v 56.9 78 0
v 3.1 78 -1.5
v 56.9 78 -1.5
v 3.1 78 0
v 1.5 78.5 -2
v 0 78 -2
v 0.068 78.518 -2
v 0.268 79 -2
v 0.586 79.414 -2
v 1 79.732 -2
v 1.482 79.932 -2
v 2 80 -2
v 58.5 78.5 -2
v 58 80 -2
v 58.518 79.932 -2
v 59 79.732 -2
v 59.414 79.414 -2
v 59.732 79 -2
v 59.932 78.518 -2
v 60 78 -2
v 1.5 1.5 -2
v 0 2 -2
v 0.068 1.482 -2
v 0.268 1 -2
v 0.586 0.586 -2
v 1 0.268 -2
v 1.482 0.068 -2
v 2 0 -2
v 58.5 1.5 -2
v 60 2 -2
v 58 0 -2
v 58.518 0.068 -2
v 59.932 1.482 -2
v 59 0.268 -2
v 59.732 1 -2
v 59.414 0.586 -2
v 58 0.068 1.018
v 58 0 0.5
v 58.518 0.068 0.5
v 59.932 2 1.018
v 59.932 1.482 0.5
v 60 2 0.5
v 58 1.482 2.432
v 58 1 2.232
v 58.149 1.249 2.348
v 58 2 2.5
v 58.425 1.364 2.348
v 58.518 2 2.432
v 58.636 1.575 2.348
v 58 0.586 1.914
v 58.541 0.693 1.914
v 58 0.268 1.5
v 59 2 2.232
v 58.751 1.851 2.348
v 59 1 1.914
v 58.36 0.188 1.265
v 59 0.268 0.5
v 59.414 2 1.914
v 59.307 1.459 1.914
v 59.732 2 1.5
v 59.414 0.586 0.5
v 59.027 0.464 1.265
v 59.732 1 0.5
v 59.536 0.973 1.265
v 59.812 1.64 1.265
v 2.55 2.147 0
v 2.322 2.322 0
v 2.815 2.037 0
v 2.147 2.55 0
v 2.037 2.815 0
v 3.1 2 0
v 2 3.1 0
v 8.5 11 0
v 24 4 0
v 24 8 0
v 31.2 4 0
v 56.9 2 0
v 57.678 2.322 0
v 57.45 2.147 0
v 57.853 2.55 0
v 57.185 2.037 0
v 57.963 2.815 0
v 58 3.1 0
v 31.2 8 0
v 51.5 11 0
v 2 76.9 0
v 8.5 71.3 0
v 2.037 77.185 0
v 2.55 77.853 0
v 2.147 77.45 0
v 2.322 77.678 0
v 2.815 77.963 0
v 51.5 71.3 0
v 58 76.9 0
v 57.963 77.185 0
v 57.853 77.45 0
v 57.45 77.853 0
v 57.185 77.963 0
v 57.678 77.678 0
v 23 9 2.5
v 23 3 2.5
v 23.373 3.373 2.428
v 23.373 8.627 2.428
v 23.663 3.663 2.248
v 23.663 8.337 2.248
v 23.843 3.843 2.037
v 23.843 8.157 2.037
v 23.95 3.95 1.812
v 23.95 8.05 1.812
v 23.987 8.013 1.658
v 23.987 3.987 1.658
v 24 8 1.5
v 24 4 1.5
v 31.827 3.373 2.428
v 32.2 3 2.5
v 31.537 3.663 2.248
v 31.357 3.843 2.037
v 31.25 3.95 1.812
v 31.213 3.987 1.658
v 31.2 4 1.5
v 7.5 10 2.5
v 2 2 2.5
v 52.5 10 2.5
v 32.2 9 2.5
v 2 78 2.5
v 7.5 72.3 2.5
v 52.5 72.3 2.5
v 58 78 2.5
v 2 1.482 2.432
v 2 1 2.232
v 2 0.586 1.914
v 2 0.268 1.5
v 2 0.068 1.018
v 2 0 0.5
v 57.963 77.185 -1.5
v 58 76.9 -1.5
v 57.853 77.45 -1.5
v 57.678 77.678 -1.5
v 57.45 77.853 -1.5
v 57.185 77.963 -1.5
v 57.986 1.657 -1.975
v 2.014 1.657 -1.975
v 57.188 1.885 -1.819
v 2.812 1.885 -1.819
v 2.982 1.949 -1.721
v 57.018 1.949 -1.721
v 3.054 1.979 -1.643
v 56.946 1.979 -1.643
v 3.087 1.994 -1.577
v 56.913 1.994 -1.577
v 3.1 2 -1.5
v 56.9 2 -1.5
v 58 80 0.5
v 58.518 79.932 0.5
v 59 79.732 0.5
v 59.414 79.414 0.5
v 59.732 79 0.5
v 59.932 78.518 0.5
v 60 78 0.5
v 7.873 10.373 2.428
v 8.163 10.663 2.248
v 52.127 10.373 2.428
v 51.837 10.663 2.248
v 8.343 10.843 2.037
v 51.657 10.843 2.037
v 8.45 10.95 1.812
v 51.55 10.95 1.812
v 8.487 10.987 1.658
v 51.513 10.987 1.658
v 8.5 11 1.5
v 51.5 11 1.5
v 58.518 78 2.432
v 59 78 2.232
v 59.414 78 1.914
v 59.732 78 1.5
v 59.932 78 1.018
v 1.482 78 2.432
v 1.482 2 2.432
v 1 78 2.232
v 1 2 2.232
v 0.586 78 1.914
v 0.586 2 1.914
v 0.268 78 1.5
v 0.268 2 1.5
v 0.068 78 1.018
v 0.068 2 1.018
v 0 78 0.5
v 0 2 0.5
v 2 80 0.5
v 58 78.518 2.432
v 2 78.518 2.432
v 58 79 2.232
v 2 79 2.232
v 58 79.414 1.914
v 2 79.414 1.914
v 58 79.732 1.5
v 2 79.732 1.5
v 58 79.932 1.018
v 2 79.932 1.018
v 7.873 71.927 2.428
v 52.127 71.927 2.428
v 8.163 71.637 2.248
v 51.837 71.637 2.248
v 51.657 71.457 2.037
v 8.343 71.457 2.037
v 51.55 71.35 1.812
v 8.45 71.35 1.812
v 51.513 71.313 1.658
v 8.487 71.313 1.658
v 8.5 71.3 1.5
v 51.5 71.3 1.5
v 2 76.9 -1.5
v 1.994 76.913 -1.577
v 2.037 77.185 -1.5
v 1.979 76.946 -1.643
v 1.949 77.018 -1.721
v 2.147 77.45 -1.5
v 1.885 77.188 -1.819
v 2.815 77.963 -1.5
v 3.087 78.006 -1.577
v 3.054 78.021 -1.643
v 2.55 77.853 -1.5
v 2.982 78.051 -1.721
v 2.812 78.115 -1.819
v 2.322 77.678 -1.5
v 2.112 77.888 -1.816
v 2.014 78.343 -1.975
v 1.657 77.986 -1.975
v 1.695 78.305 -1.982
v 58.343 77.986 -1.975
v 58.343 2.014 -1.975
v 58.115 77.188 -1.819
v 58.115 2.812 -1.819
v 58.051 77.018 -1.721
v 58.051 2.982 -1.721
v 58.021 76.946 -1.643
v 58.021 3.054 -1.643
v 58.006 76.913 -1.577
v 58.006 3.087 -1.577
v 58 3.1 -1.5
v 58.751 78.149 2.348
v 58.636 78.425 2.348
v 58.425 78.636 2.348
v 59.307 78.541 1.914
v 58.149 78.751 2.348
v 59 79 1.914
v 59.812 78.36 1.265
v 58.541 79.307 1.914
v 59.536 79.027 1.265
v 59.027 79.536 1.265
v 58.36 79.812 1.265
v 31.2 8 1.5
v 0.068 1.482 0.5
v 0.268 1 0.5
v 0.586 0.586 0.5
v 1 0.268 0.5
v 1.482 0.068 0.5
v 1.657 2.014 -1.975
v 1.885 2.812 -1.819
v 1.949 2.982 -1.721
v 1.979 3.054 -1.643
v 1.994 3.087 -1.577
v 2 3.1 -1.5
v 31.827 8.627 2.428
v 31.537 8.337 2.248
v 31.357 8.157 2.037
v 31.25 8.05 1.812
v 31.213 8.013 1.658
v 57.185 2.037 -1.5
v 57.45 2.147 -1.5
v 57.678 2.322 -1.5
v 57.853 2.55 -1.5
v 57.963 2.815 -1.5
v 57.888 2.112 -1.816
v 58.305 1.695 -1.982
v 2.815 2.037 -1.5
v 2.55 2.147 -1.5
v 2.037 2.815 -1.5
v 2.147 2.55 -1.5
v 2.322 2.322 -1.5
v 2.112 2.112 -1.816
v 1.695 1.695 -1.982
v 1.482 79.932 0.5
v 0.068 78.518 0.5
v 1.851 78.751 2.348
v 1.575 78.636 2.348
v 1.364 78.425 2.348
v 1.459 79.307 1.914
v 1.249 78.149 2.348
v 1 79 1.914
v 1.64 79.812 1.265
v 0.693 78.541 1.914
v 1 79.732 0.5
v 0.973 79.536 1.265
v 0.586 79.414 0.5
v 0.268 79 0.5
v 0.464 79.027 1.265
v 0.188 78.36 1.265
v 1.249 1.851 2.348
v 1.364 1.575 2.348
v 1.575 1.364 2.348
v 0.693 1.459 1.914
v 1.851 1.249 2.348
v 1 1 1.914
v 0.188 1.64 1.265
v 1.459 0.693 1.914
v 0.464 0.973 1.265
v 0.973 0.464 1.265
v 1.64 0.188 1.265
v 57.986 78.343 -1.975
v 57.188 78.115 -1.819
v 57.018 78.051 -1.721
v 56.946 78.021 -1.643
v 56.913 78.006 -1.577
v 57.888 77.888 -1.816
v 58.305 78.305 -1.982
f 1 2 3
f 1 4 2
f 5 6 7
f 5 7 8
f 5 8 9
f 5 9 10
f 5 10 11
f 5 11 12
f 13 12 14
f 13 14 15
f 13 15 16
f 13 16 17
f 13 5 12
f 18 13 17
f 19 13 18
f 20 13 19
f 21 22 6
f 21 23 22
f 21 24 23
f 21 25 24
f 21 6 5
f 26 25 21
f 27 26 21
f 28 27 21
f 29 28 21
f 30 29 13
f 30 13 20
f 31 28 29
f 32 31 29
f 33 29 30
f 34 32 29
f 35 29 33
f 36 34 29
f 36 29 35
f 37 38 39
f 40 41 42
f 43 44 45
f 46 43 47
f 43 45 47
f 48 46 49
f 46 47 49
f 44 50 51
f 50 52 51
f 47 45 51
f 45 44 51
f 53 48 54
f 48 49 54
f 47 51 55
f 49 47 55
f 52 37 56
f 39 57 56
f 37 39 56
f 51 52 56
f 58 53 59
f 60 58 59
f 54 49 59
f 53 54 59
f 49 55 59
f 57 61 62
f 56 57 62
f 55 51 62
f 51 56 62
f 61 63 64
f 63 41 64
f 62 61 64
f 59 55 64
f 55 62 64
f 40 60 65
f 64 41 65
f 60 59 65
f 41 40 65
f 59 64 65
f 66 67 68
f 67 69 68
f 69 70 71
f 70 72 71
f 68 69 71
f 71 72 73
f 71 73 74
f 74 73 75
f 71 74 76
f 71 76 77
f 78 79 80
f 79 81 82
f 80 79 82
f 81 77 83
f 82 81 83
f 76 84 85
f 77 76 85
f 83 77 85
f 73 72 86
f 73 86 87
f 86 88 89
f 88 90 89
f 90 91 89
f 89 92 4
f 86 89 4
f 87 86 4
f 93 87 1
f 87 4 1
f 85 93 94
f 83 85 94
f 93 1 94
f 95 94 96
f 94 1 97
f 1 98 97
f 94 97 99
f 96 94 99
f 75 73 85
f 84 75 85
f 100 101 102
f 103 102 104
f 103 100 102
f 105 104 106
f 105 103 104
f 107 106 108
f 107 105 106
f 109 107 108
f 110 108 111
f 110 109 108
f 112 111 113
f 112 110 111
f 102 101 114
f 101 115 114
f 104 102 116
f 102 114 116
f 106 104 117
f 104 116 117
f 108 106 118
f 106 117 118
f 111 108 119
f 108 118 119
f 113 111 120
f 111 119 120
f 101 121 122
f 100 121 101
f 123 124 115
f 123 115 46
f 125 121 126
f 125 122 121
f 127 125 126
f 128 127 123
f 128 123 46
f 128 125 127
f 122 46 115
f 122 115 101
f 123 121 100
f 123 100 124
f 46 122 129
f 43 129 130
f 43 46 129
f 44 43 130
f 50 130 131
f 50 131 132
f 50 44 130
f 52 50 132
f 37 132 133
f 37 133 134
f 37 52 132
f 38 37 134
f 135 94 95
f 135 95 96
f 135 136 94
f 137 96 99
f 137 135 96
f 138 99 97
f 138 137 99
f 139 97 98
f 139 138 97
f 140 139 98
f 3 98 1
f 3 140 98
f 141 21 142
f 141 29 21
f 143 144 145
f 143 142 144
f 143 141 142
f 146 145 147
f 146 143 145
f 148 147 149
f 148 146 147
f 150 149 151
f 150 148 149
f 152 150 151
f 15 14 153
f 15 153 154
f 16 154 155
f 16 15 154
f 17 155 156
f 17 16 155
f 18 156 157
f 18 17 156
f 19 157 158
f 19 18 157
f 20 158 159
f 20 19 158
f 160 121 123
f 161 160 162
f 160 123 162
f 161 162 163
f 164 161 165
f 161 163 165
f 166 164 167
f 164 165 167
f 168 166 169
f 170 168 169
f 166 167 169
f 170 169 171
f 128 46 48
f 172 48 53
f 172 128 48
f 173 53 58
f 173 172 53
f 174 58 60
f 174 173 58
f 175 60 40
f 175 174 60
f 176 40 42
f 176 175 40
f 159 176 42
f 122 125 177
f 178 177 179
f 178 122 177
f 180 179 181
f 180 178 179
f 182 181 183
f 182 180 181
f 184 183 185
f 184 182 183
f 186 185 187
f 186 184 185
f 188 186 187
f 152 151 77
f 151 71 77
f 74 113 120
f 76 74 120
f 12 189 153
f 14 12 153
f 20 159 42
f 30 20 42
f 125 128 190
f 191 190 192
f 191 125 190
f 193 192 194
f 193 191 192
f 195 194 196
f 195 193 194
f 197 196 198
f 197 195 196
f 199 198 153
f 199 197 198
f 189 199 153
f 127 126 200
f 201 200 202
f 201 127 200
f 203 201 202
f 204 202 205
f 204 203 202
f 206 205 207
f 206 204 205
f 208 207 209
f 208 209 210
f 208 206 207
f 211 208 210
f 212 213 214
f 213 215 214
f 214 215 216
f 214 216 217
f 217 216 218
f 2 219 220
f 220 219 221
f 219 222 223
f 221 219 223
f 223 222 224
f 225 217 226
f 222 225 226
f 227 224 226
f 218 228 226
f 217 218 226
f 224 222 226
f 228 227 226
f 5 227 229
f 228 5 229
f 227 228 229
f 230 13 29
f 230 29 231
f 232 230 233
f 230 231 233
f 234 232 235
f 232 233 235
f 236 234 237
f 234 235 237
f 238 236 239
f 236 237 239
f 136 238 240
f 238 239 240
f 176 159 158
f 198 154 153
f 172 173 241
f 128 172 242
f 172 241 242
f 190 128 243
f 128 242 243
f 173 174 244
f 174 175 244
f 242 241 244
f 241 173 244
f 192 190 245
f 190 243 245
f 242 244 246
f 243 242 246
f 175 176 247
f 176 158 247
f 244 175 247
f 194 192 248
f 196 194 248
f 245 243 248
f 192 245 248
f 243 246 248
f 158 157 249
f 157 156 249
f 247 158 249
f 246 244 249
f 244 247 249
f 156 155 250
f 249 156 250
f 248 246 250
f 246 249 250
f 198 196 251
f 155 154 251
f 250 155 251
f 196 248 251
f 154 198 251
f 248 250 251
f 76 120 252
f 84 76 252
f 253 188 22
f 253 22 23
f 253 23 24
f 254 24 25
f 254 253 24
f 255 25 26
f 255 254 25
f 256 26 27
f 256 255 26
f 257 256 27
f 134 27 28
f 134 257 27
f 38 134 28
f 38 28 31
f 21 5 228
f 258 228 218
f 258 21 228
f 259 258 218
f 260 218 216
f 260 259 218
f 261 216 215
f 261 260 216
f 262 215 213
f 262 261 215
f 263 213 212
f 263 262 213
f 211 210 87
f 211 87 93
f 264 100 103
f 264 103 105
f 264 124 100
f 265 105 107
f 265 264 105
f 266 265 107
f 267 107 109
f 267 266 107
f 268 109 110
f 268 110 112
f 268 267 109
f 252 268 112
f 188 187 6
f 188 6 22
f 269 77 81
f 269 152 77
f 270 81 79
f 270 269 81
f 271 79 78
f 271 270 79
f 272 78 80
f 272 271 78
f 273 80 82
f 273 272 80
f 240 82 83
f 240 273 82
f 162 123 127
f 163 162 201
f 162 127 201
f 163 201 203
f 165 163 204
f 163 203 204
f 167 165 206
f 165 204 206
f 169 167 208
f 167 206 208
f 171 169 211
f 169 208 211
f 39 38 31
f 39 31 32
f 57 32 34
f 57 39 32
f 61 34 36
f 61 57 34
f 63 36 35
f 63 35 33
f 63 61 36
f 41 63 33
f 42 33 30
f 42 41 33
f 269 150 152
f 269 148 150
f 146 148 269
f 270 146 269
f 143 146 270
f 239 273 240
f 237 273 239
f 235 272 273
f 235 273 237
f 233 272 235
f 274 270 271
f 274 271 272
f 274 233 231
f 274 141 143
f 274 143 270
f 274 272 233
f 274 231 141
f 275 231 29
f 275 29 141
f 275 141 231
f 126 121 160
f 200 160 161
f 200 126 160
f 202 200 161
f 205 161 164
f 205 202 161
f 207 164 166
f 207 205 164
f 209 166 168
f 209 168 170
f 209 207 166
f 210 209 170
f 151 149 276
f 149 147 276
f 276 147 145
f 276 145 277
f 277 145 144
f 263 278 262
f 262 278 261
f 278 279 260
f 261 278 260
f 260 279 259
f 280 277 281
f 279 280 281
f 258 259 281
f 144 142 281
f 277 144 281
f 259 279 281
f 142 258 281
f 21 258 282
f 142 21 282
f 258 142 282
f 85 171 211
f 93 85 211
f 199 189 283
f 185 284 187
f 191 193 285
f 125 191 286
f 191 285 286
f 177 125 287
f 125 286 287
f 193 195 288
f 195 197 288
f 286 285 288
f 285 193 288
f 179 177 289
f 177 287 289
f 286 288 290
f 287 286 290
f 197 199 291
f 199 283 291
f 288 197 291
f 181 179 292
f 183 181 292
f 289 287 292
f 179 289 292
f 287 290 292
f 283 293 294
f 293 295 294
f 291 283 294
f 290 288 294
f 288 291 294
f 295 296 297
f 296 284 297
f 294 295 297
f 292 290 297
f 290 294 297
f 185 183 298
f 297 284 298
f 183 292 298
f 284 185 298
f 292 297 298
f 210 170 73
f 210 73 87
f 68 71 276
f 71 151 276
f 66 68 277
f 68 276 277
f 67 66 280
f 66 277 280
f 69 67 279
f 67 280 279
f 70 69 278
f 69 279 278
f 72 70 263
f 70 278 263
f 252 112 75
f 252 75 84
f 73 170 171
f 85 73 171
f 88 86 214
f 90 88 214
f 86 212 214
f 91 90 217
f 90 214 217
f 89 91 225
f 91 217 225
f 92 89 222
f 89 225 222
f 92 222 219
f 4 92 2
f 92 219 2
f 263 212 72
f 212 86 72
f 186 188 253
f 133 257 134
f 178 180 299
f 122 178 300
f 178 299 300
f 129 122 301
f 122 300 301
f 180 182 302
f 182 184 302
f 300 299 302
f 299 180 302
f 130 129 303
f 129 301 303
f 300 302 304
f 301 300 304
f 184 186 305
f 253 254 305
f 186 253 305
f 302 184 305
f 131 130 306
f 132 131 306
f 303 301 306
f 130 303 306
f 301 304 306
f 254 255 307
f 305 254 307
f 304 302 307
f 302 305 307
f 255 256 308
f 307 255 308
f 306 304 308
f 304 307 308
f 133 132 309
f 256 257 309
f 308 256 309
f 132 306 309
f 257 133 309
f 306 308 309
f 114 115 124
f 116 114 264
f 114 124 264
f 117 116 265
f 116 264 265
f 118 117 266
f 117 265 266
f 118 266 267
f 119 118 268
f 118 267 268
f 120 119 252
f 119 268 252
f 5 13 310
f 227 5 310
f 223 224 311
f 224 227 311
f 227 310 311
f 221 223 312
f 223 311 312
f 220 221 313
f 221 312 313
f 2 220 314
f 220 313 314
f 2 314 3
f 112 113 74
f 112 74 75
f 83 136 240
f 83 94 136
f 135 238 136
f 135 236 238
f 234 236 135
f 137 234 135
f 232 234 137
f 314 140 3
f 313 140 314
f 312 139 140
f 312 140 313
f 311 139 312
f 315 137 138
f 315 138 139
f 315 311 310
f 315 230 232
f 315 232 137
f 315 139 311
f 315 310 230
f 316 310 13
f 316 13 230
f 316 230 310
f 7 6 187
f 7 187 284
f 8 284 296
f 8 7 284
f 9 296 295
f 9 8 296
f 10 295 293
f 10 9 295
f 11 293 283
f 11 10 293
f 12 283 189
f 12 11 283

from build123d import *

# Parameters (mm, degrees)
SKETCH003_W     = 60
SKETCH003_H     = 80
PAD_DEPTH       = 2.5
SKETCH_W        = 43
SKETCH_H        = 60.3
POCKET_DEPTH    = 5
SKETCH004_W     = 60
SKETCH004_H     = 80
SKETCH004_W_2   = 56
SKETCH004_H_2   = 76
PAD001_DEPTH    = 2
SKETCH005_W     = 7.2
SKETCH005_H     = 4
POCKET001_DEPTH = 5
FILLET_R        = 2
FILLET001_R     = 1
FILLET002_R     = 1
FILLET003_R     = 2
FILLET004_R     = 0.5
FILLET005_R     = 1.1


with BuildPart() as part:
    # Sketch003 → Pad (new body)
    with BuildSketch(Plane.XY):
        with Locations((30, 40)):
            Rectangle(SKETCH003_W, SKETCH003_H)
    extrude(amount=PAD_DEPTH)

    # Sketch (on Face6 of Pad) → Pocket (cut)
    with BuildSketch(Plane.XY.offset(2.5)):
        with Locations((30, 41.15)):
            Rectangle(SKETCH_W, SKETCH_H)
    extrude(amount=-POCKET_DEPTH, mode=Mode.SUBTRACT)

    # Sketch004 (on Face4 of Pocket) → Pad001 (join)
    with BuildSketch(Plane(origin=(0, 0, 0), x_dir=(1, 0, 0), z_dir=(0, 0, -1))):
        with Locations((30, -40)):
            Rectangle(SKETCH004_W, SKETCH004_H)
        with Locations((30, -40)):
            Rectangle(SKETCH004_W_2, SKETCH004_H_2, mode=Mode.SUBTRACT)
    extrude(amount=PAD001_DEPTH)

    # Sketch005 (on Face7 of Pad001) → Pocket001 (cut)
    with BuildSketch(Plane.XY.offset(2.5)):
        with Locations((27.6, 6)):
            Rectangle(SKETCH005_W, SKETCH005_H)
    extrude(amount=-POCKET001_DEPTH, mode=Mode.SUBTRACT)

    # Fillet
    fillet_edges = [part.edges().sort_by_distance(p)[0] for p in [
        (60, 0, 0.25),
        (0, 0, 0.25),
        (0, 80, 0.25),
        (60, 80, 0.25),
    ]]
    fillet(fillet_edges, radius=FILLET_R)

    # Fillet001
    fillet001_edges = [part.edges().sort_by_distance(p)[0] for p in [
        (30, 11, 2.5),
        (8.5, 41.15, 2.5),
        (30, 71.3, 2.5),
        (51.5, 41.15, 2.5),
    ]]
    fillet(fillet001_edges, radius=FILLET001_R)

    # Fillet002
    fillet002_edges = [part.edges().sort_by_distance(p)[0] for p in [
        (27.6, 4, 2.5),
        (24, 6, 2.5),
        (27.6, 8, 2.5),
        (31.2, 6, 2.5),
    ]]
    fillet(fillet002_edges, radius=FILLET002_R)

    # Fillet003
    fillet003_edges = [part.edges().sort_by_distance(p)[0] for p in [
        (30, 0, 2.5),
        (59.414214, 0.585786, 2.5),
        (60, 40, 2.5),
        (0.585786, 0.585786, 2.5),
        (0, 40, 2.5),
        (59.414214, 79.414214, 2.5),
        (30, 80, 2.5),
        (0.585786, 79.414214, 2.5),
    ]]
    fillet(fillet003_edges, radius=FILLET003_R)

    # Fillet004
    fillet004_edges = [part.edges().sort_by_distance(p)[0] for p in [
        (30, 2, -2),
        (58, 40, -2),
        (30, 78, -2),
        (2, 40, -2),
    ]]
    fillet(fillet004_edges, radius=FILLET004_R)

    # Fillet005
    fillet005_edges = [part.edges().sort_by_distance(p)[0] for p in [
        (2, 2, -0.75),
        (58, 2, -0.75),
        (2, 78, -0.75),
        (58, 78, -0.75),
    ]]
    fillet(fillet005_edges, radius=FILLET005_R)


solid = part.part
